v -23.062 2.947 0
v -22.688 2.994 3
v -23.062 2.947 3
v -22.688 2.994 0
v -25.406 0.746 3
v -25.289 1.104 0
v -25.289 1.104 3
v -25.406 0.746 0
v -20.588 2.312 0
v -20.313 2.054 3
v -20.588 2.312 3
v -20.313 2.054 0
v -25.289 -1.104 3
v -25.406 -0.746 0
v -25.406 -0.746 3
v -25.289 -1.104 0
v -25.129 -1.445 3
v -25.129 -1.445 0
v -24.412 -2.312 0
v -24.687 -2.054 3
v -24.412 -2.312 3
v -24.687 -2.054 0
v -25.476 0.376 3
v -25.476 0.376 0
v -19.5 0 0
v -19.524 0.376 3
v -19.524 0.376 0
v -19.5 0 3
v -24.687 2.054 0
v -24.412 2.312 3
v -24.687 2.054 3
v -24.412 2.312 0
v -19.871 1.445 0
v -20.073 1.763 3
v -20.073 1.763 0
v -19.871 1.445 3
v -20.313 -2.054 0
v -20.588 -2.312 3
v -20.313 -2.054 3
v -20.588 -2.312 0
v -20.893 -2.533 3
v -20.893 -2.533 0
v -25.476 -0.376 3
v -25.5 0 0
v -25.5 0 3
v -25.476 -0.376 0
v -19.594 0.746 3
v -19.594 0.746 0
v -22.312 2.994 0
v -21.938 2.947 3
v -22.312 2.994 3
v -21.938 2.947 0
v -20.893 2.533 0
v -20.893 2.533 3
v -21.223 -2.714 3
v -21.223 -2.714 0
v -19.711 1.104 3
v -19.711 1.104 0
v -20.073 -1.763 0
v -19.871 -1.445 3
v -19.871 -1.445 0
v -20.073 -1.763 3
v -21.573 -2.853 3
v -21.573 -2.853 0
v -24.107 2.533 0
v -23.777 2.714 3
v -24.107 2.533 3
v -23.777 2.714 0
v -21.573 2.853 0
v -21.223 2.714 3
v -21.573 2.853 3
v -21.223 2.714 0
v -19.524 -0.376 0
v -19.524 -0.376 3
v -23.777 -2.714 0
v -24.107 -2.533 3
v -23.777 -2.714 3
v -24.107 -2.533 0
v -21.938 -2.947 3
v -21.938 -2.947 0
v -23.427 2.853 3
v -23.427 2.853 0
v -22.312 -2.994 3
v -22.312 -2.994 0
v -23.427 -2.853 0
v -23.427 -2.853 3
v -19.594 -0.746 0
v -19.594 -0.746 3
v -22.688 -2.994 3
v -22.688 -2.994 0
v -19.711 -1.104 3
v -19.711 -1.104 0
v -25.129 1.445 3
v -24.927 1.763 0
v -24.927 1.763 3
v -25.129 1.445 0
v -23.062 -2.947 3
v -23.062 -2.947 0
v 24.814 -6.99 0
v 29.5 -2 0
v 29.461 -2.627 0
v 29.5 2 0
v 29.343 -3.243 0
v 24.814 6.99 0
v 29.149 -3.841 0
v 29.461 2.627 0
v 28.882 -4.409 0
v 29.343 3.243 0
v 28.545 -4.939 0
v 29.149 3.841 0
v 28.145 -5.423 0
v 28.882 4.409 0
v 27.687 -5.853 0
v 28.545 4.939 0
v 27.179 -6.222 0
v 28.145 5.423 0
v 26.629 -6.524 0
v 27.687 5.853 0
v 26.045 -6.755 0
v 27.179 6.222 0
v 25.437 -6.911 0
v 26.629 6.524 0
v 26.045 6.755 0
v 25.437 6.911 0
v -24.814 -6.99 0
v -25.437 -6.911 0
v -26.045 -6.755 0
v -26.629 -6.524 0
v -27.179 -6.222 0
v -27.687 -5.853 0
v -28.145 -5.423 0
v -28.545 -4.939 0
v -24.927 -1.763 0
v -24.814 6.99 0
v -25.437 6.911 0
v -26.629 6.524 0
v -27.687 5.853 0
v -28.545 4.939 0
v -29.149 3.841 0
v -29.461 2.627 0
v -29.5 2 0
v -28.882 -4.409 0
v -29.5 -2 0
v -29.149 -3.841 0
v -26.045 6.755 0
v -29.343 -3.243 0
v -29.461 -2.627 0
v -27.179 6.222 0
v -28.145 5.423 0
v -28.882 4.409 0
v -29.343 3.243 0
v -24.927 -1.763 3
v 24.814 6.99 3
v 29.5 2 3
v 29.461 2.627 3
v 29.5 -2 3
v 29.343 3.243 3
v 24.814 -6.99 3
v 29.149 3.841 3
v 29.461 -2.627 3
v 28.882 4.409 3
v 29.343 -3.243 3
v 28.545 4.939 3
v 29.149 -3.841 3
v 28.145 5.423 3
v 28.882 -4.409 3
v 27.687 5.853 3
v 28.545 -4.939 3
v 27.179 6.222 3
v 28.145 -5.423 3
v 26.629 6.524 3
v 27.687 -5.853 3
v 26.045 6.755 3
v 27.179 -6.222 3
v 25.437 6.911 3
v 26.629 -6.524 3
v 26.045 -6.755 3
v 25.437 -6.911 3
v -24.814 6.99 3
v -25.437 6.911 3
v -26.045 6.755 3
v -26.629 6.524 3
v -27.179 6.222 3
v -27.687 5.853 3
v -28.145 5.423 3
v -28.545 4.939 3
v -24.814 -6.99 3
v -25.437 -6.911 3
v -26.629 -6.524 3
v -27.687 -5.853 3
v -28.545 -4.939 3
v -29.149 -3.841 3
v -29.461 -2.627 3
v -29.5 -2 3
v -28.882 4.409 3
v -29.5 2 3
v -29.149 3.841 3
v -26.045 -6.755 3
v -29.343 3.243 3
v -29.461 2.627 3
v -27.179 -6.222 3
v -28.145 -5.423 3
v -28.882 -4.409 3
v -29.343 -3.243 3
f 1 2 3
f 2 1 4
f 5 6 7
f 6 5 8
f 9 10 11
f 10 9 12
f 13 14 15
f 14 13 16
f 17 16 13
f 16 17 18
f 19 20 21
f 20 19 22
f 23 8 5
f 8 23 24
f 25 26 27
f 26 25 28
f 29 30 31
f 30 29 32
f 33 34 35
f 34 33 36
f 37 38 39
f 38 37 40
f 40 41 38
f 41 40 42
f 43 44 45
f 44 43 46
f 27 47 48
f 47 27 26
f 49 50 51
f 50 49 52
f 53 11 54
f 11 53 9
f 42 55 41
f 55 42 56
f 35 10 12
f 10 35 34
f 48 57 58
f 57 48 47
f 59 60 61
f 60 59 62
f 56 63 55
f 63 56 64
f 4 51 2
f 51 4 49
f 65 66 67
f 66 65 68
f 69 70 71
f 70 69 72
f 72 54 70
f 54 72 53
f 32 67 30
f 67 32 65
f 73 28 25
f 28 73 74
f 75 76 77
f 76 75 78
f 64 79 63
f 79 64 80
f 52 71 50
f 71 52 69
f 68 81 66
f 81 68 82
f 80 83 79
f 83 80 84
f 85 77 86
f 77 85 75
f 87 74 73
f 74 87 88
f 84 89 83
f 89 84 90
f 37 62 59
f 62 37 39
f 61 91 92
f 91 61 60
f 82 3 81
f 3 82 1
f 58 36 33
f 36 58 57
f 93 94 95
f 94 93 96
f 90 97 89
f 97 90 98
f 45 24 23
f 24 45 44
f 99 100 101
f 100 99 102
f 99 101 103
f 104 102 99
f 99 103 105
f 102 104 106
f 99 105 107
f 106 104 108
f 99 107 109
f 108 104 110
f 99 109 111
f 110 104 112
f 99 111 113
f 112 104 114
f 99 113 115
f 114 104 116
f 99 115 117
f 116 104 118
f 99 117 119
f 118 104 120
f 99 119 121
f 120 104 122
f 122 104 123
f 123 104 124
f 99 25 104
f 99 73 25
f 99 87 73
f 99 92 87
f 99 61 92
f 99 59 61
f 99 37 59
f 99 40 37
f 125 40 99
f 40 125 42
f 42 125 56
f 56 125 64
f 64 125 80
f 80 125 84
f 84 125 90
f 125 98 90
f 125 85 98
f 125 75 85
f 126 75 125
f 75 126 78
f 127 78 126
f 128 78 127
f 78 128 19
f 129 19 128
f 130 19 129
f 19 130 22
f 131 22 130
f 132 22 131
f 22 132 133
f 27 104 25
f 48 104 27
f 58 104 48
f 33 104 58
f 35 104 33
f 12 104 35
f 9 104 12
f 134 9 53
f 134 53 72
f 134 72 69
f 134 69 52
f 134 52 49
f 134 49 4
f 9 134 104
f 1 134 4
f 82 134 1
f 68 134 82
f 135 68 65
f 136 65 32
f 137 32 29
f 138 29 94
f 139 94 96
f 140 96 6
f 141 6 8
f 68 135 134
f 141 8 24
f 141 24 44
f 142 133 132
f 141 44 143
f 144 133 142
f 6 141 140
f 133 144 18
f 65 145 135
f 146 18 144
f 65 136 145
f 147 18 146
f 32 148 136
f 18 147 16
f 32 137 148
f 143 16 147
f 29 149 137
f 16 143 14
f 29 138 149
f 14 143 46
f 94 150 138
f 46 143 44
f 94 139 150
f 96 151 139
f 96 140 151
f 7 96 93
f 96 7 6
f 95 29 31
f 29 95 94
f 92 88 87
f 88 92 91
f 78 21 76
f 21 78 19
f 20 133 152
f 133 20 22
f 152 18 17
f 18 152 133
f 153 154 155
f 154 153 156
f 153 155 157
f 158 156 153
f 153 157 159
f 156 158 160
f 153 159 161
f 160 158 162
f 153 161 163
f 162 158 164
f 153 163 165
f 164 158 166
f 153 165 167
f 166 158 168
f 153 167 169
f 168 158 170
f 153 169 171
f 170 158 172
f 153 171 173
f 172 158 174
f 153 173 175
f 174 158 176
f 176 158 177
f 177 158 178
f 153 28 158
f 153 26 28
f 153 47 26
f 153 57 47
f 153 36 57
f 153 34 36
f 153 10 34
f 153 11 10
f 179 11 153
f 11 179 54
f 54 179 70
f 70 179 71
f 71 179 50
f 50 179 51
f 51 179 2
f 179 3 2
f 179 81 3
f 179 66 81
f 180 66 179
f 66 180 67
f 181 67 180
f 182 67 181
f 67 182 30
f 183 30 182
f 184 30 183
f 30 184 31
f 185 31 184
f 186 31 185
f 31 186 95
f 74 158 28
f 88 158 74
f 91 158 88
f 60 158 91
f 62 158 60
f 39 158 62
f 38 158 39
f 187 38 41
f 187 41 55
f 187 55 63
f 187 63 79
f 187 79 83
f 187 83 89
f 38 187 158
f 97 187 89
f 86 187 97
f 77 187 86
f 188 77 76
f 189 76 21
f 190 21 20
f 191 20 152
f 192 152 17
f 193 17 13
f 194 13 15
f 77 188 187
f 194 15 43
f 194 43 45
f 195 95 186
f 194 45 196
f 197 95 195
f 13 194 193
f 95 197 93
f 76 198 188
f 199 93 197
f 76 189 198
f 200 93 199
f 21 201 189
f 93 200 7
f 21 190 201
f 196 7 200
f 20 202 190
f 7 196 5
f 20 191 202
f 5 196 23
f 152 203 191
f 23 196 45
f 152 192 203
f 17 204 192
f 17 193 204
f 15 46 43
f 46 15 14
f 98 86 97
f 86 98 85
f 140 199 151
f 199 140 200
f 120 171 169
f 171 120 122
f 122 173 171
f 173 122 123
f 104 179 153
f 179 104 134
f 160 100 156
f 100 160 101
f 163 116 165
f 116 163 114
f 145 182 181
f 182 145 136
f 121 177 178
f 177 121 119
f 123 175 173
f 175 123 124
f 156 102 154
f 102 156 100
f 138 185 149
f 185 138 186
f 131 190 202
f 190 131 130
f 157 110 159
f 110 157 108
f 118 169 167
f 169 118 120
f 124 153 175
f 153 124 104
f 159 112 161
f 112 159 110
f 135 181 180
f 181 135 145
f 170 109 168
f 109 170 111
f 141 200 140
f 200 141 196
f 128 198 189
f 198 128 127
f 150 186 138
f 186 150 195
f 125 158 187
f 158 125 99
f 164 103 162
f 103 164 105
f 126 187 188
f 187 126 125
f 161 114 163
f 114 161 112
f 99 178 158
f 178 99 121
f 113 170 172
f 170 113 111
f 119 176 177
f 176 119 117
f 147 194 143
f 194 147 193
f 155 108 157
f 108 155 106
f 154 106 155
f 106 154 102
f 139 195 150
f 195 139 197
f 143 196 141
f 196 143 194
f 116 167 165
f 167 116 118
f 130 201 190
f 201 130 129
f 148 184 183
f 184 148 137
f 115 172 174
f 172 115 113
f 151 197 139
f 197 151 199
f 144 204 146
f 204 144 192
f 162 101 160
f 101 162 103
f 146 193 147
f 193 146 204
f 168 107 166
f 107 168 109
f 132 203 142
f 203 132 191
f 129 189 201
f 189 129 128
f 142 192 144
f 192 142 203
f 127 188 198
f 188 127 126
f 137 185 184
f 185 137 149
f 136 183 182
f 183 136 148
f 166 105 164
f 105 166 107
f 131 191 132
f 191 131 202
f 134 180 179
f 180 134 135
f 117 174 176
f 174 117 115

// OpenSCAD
$fn = 50;


difference() {
	union() {
		hull() {
			translate(v = [-24.5000000000, 2.0000000000, 0]) {
				cylinder(h = 3, r = 5);
			}
			translate(v = [24.5000000000, 2.0000000000, 0]) {
				cylinder(h = 3, r = 5);
			}
			translate(v = [-24.5000000000, -2.0000000000, 0]) {
				cylinder(h = 3, r = 5);
			}
			translate(v = [24.5000000000, -2.0000000000, 0]) {
				cylinder(h = 3, r = 5);
			}
		}
	}
	union() {
		translate(v = [-22.5000000000, 0.0000000000, 0]) {
			cylinder(h = 3, r = 3.0000000000);
		}
		translate(v = [-22.5000000000, 0.0000000000, 0]) {
			cylinder(h = 3, r = 1.5000000000);
		}
		translate(v = [-22.5000000000, 0.0000000000, 0]) {
			cylinder(h = 3, r = 1.5000000000);
		}
		translate(v = [-22.5000000000, 0.0000000000, 0]) {
			cylinder(h = 3, r = 1.5000000000);
		}
	}
}
